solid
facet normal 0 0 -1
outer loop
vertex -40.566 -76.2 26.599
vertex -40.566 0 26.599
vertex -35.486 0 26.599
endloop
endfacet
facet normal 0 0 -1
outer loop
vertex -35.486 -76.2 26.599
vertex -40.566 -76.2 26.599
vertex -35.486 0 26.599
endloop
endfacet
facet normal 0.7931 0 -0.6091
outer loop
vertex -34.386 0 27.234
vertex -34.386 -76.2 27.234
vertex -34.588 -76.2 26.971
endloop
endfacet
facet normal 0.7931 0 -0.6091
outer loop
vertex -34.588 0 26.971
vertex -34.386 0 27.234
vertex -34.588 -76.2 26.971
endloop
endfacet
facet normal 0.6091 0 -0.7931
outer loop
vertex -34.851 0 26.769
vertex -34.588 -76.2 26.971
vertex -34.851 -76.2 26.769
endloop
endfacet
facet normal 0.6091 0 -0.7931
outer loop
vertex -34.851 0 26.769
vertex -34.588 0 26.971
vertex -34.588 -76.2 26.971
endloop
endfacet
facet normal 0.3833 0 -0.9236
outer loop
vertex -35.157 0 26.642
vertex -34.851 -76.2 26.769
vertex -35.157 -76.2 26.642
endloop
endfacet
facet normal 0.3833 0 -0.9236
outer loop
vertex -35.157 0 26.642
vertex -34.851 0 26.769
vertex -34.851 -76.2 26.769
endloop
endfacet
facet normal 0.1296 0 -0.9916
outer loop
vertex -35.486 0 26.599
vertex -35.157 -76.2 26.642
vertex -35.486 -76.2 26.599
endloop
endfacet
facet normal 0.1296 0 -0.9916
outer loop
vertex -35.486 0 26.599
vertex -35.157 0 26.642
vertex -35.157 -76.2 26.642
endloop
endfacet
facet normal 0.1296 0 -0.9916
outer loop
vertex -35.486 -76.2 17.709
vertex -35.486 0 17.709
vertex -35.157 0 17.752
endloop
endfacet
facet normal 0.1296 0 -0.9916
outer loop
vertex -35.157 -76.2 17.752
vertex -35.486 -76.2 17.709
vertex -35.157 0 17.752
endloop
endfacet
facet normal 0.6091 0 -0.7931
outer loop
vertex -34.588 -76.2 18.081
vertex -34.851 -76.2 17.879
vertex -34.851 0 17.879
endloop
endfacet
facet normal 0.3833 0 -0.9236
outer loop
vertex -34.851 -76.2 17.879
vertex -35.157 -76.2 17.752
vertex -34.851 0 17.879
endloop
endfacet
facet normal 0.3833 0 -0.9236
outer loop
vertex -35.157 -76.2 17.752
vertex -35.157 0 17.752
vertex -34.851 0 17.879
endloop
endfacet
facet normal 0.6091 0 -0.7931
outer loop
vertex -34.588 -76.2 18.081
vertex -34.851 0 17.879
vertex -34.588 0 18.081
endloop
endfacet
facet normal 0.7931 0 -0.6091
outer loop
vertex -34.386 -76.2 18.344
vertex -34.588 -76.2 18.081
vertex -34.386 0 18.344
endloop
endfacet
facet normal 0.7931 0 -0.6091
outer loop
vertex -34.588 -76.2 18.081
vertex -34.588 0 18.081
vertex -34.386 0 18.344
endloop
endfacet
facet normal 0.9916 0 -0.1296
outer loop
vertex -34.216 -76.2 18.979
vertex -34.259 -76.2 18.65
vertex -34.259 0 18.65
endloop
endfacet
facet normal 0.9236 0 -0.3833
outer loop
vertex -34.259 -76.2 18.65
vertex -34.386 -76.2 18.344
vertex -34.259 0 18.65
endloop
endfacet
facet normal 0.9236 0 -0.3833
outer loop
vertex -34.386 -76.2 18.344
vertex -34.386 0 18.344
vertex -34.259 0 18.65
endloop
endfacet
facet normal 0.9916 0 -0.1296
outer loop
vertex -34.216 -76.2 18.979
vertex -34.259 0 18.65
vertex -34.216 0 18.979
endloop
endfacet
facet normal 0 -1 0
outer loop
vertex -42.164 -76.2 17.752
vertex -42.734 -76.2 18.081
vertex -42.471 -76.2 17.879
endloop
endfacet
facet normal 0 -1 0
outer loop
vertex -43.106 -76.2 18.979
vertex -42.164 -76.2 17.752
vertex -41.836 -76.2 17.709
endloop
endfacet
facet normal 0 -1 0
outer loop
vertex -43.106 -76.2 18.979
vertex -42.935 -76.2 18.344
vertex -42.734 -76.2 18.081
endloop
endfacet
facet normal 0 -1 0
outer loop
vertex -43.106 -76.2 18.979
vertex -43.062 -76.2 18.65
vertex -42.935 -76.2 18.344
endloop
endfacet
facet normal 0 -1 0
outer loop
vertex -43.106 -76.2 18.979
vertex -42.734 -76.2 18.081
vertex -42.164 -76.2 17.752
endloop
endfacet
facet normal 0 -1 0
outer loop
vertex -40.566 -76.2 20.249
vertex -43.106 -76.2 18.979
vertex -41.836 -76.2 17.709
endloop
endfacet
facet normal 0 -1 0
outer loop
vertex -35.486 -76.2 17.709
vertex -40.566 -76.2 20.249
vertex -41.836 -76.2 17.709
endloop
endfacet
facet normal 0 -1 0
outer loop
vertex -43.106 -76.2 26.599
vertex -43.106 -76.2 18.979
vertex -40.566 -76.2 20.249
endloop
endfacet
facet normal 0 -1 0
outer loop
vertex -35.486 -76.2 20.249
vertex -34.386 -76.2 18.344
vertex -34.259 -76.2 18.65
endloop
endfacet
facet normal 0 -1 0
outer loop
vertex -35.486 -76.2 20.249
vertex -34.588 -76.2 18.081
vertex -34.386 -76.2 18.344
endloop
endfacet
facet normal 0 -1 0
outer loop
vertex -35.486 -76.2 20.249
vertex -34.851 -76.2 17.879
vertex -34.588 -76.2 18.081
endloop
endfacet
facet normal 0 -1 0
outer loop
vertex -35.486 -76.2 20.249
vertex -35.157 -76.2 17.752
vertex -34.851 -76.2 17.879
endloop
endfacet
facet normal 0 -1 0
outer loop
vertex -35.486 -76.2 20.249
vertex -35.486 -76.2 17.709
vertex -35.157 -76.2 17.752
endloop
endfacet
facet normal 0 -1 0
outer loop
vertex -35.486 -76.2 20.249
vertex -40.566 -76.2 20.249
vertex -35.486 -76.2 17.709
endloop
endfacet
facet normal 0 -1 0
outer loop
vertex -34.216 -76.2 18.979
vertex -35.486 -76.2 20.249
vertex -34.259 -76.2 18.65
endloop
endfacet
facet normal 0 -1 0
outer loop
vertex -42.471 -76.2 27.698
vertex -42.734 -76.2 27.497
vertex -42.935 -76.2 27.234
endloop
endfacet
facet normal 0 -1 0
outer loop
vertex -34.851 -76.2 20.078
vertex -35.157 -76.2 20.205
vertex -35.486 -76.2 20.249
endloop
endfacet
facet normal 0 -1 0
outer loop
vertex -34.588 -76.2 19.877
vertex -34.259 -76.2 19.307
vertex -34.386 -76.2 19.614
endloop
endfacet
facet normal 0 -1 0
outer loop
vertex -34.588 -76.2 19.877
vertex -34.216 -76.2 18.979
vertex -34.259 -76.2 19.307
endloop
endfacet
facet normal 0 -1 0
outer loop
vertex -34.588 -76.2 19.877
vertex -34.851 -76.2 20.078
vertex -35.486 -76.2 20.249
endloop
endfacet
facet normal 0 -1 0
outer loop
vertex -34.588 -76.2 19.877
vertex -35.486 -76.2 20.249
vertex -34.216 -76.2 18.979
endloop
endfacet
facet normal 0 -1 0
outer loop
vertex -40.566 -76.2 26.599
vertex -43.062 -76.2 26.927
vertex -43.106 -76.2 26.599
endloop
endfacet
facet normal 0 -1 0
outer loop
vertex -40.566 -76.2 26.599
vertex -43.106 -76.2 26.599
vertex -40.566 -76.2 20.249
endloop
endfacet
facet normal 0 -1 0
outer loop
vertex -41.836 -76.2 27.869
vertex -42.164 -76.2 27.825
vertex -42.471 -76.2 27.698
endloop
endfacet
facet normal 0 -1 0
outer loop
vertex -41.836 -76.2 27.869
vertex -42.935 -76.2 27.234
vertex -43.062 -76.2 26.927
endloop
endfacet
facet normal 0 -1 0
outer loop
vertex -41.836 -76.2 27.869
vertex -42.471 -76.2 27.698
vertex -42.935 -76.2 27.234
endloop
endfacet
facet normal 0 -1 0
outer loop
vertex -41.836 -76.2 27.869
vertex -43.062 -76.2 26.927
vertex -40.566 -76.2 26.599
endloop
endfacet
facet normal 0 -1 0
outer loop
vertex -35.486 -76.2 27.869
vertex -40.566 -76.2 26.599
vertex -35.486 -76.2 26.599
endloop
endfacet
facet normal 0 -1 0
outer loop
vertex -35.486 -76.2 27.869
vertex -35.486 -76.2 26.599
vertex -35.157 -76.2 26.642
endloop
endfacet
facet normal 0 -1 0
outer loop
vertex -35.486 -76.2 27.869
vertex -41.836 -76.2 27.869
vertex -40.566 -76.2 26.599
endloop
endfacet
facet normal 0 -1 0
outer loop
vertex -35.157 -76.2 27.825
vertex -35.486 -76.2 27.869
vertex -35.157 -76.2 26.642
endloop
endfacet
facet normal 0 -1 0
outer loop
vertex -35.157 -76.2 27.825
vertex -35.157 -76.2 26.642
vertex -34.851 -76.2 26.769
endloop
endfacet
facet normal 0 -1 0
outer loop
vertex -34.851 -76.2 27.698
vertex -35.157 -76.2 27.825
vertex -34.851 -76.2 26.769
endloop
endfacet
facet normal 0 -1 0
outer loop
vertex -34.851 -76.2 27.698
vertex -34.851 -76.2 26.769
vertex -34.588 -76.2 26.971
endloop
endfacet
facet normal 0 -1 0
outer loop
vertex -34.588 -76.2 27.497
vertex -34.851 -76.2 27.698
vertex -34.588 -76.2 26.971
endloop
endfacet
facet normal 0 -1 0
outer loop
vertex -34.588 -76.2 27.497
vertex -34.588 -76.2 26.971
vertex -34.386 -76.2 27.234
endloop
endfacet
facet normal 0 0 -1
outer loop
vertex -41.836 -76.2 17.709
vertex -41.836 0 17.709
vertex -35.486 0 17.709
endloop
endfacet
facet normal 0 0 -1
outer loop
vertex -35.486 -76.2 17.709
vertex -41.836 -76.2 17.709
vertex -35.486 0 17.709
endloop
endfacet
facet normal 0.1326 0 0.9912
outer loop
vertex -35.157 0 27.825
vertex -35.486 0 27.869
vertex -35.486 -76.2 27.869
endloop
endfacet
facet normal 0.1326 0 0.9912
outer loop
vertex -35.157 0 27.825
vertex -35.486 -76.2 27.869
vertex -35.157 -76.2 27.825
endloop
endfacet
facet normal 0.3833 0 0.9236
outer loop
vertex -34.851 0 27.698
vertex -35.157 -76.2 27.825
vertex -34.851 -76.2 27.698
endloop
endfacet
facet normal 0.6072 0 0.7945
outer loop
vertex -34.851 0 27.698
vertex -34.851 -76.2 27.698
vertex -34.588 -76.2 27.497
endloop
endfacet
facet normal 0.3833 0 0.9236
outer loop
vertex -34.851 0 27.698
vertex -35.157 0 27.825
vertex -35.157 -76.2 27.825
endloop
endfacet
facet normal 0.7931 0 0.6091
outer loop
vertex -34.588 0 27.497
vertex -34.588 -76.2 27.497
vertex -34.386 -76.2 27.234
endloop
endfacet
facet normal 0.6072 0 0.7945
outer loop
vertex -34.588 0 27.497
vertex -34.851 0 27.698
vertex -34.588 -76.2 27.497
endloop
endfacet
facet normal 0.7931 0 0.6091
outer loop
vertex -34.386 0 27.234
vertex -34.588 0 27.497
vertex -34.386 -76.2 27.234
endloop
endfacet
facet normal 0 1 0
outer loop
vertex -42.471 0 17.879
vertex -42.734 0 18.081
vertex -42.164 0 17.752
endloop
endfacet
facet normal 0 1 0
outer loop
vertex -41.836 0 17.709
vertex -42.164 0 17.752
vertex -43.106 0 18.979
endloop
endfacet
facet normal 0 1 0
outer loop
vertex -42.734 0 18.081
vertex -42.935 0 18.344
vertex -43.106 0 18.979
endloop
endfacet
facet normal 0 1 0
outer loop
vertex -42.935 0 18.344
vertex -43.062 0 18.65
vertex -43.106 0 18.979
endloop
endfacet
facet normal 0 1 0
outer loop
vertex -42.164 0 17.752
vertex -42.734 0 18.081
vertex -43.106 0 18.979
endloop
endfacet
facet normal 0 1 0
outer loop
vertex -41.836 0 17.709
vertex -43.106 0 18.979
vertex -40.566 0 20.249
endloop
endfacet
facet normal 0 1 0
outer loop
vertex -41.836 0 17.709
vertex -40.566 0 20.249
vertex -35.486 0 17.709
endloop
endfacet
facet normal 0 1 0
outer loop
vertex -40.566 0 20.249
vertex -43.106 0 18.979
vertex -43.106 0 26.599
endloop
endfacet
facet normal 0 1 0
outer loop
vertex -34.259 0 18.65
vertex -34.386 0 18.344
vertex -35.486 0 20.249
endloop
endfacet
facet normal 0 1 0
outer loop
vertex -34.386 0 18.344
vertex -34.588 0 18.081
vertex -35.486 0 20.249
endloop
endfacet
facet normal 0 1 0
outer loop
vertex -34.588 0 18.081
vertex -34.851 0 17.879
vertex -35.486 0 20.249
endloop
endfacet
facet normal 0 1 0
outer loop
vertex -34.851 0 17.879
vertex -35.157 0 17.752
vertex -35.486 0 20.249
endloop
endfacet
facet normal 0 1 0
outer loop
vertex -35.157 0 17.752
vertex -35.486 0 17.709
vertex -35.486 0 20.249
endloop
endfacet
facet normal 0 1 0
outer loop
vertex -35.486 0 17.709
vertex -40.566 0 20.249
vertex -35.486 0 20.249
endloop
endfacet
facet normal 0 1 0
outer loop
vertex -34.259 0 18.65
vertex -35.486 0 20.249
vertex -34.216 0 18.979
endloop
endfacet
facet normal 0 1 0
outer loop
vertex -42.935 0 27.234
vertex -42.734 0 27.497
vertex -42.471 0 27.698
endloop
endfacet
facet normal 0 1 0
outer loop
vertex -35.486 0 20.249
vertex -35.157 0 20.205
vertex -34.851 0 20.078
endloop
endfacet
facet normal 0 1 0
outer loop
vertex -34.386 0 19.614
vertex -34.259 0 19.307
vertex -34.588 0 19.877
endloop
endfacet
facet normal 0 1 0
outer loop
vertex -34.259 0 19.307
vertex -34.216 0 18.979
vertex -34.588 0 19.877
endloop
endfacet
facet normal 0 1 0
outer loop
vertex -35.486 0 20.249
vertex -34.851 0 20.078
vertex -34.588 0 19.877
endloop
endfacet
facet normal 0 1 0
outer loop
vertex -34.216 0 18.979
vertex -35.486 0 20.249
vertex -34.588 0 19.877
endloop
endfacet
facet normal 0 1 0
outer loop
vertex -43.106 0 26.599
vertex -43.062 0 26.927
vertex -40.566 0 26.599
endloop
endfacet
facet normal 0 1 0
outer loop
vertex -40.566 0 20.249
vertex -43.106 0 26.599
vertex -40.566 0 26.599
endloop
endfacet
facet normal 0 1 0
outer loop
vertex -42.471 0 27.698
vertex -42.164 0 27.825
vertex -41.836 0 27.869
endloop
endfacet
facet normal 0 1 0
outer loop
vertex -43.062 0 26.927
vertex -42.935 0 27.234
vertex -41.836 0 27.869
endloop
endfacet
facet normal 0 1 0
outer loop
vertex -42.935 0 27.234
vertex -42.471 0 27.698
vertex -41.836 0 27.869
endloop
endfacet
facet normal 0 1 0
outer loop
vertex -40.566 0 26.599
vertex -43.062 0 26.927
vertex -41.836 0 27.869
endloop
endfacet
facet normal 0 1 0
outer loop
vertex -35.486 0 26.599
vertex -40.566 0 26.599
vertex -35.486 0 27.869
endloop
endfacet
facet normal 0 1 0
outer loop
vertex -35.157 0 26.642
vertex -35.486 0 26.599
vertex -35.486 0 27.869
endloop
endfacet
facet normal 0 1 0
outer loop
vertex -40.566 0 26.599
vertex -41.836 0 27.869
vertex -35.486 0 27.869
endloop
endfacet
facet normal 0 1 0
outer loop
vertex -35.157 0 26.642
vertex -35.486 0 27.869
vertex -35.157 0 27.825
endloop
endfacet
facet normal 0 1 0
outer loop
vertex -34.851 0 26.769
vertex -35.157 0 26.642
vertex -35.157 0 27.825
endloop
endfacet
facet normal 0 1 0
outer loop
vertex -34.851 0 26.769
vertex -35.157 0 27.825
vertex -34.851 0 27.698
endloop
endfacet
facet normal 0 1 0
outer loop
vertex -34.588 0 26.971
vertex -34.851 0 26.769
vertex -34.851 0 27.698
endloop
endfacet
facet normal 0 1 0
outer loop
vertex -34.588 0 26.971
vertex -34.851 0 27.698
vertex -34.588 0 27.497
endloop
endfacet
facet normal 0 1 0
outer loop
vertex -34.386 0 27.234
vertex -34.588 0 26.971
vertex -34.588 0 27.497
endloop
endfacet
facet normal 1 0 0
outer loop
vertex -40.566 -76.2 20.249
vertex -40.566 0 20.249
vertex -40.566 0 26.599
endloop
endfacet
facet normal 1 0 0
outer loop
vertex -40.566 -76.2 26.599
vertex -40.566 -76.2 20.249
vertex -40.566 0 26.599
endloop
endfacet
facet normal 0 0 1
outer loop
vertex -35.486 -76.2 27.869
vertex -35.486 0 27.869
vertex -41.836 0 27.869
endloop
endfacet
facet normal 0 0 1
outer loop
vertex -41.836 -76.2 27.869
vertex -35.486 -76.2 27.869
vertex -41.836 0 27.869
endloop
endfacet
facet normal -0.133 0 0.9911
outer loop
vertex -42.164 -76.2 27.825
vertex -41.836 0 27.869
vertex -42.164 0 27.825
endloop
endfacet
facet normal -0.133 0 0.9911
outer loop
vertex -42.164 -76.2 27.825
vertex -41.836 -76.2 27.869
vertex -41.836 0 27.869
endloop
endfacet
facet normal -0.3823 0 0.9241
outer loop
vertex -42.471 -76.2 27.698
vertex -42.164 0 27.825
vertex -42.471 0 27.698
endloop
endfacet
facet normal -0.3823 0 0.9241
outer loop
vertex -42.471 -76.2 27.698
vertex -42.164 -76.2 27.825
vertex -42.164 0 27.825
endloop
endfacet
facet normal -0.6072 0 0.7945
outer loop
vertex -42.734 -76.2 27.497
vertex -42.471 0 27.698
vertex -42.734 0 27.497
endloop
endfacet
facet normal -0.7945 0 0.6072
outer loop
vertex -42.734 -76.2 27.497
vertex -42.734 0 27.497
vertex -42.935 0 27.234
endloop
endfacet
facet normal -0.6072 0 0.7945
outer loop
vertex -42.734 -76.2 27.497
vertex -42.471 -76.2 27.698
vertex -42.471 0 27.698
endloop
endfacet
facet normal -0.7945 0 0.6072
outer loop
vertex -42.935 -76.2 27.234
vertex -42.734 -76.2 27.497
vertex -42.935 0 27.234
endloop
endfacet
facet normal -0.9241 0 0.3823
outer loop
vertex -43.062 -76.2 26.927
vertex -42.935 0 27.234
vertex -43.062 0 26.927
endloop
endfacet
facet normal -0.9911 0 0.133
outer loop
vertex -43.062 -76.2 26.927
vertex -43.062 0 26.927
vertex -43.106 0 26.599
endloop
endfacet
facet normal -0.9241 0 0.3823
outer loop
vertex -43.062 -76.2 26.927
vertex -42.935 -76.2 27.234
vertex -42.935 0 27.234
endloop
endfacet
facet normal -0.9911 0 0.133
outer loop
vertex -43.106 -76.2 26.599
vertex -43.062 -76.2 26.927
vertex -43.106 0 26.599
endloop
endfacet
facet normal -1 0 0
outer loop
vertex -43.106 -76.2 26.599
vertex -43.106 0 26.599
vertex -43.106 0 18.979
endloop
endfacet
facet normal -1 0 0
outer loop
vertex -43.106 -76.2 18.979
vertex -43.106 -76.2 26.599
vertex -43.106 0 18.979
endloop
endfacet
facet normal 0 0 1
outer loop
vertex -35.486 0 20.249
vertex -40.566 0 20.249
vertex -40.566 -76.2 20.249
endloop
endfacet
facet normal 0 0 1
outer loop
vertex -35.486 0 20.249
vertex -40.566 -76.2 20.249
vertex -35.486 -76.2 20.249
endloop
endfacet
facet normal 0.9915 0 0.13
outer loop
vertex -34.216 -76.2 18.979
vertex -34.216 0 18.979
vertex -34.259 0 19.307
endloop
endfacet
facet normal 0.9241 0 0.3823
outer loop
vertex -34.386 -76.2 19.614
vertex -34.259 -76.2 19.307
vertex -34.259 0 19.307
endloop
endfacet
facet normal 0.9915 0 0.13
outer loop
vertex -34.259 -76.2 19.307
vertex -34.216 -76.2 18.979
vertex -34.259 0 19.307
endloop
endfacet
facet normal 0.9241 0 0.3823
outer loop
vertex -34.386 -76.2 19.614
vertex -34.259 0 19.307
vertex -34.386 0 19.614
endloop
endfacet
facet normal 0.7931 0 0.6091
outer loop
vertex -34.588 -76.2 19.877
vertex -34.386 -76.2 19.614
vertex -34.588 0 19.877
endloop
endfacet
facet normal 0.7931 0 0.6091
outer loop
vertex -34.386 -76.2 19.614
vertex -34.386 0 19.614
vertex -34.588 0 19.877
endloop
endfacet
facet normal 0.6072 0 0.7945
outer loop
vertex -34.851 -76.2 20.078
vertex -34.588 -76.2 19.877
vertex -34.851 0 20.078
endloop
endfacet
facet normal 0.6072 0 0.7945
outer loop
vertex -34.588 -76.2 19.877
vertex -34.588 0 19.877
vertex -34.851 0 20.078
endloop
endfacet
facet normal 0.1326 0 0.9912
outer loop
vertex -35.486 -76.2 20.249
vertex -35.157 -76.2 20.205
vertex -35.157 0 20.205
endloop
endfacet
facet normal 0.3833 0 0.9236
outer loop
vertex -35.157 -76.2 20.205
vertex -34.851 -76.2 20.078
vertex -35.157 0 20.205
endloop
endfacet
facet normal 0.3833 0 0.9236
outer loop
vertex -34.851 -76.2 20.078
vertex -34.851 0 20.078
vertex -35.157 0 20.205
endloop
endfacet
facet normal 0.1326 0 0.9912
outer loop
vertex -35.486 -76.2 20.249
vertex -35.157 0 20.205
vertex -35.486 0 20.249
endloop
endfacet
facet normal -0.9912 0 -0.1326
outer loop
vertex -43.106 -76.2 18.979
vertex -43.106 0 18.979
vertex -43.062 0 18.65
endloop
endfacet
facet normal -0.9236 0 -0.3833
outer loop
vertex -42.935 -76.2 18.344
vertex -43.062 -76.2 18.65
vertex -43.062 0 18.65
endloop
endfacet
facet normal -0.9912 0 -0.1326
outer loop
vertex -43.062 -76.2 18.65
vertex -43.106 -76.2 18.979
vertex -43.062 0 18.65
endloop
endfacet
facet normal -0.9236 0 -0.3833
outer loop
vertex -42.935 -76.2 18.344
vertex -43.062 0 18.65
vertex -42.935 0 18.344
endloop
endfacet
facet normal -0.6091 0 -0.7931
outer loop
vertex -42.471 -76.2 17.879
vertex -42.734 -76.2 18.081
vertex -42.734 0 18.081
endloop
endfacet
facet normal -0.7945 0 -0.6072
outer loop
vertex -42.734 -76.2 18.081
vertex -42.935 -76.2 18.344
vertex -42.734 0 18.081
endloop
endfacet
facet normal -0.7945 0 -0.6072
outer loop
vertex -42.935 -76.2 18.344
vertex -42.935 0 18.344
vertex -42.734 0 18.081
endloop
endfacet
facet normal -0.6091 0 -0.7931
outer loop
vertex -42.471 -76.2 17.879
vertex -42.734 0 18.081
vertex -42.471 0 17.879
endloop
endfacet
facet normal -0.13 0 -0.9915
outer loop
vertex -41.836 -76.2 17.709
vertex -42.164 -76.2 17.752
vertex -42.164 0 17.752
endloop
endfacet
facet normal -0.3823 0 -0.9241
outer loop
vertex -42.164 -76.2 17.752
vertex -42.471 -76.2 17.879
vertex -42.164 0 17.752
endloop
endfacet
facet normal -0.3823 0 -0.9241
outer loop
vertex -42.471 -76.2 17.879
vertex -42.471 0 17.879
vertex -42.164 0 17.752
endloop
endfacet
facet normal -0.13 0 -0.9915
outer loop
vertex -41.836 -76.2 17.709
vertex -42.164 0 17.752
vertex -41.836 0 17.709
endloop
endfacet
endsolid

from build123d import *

# Parameters (mm, degrees)
F0_W        = 6.35
F0_H        = 2.54
F1_DEPTH    = 76.2
F2_R        = 1.27
F3_T1_DEPTH = 82.55


# Not quite as in the source:
# - a fillet or chamfer that OpenCascade refuses, or shapes differently, is made with other operations: its cross-section is extruded or revolved along the edge and cut away or added


with BuildPart() as f1:
    # F0 (on Front) → F1 (new body)
    with BuildSketch(Plane.XZ):
        Polygon((-43.1055540526, 26.5985474133), (-40.5655540526, 26.5985474133), (-34.2155540526, 26.5985474133), (-34.2155540526, 27.8685474133), (-43.1055540526, 27.8685474133), align=None)
        Polygon((-40.5655540526, 20.2485474133), (-40.5655540526, 26.5985474133), (-43.1055540526, 26.5985474133), (-43.1055540526, 17.7085474133), (-40.5655540526, 17.7085474133), align=None)
        with Locations((-37.3905540526, 18.9785474133)):
            Rectangle(F0_W, F0_H)
    extrude(amount=F1_DEPTH)

    # F2
    f2_edges = [f1.edges().sort_by_distance(p)[0] for p in [
        (-43.105554, -38.1, 27.868547),
    ]]
    fillet(f2_edges, radius=F2_R)

    # F3: fillet of radius 1.27 on 5 edges, made by hand

    # F3_s2 → F3_t1 (cut)
    with BuildSketch(Plane.XZ.offset(-3.175)):
        with BuildLine():
            ThreePointArc((-43.1055540526, 18.9785474133), (-42.7335796647, 18.0805218012), (-41.8355540526, 17.7085474133))
            Line((-41.8355540526, 17.7085474133), (-43.1055540526, 17.7085474133))
            Line((-43.1055540526, 17.7085474133), (-43.1055540526, 18.9785474133))
        make_face()
        with BuildLine():
            ThreePointArc((-34.2155540526, 27.8685474133), (-34.5875284405, 26.9705218012), (-35.4855540526, 26.5985474133))
            Line((-35.4855540526, 26.5985474133), (-34.2155540526, 26.5985474133))
            Line((-34.2155540526, 26.5985474133), (-34.2155540526, 27.8685474133))
        make_face()
        with BuildLine():
            ThreePointArc((-34.2155540526, 18.9785474133), (-34.5875284405, 19.8765730255), (-35.4855540526, 20.2485474133))
            Line((-35.4855540526, 20.2485474133), (-34.2155540526, 20.2485474133))
            Line((-34.2155540526, 20.2485474133), (-34.2155540526, 18.9785474133))
        make_face()
        with BuildLine():
            ThreePointArc((-35.4855540526, 17.7085474133), (-34.5875284405, 18.0805218012), (-34.2155540526, 18.9785474133))
            Line((-34.2155540526, 18.9785474133), (-34.2155540526, 17.7085474133))
            Line((-34.2155540526, 17.7085474133), (-35.4855540526, 17.7085474133))
        make_face()
        with BuildLine():
            ThreePointArc((-35.4855540526, 27.8685474133), (-34.5875284405, 27.4965730255), (-34.2155540526, 26.5985474133))
            Line((-34.2155540526, 26.5985474133), (-34.2155540526, 27.8685474133))
            Line((-34.2155540526, 27.8685474133), (-35.4855540526, 27.8685474133))
        make_face()
    extrude(amount=F3_T1_DEPTH, mode=Mode.SUBTRACT)


solid = f1.part
